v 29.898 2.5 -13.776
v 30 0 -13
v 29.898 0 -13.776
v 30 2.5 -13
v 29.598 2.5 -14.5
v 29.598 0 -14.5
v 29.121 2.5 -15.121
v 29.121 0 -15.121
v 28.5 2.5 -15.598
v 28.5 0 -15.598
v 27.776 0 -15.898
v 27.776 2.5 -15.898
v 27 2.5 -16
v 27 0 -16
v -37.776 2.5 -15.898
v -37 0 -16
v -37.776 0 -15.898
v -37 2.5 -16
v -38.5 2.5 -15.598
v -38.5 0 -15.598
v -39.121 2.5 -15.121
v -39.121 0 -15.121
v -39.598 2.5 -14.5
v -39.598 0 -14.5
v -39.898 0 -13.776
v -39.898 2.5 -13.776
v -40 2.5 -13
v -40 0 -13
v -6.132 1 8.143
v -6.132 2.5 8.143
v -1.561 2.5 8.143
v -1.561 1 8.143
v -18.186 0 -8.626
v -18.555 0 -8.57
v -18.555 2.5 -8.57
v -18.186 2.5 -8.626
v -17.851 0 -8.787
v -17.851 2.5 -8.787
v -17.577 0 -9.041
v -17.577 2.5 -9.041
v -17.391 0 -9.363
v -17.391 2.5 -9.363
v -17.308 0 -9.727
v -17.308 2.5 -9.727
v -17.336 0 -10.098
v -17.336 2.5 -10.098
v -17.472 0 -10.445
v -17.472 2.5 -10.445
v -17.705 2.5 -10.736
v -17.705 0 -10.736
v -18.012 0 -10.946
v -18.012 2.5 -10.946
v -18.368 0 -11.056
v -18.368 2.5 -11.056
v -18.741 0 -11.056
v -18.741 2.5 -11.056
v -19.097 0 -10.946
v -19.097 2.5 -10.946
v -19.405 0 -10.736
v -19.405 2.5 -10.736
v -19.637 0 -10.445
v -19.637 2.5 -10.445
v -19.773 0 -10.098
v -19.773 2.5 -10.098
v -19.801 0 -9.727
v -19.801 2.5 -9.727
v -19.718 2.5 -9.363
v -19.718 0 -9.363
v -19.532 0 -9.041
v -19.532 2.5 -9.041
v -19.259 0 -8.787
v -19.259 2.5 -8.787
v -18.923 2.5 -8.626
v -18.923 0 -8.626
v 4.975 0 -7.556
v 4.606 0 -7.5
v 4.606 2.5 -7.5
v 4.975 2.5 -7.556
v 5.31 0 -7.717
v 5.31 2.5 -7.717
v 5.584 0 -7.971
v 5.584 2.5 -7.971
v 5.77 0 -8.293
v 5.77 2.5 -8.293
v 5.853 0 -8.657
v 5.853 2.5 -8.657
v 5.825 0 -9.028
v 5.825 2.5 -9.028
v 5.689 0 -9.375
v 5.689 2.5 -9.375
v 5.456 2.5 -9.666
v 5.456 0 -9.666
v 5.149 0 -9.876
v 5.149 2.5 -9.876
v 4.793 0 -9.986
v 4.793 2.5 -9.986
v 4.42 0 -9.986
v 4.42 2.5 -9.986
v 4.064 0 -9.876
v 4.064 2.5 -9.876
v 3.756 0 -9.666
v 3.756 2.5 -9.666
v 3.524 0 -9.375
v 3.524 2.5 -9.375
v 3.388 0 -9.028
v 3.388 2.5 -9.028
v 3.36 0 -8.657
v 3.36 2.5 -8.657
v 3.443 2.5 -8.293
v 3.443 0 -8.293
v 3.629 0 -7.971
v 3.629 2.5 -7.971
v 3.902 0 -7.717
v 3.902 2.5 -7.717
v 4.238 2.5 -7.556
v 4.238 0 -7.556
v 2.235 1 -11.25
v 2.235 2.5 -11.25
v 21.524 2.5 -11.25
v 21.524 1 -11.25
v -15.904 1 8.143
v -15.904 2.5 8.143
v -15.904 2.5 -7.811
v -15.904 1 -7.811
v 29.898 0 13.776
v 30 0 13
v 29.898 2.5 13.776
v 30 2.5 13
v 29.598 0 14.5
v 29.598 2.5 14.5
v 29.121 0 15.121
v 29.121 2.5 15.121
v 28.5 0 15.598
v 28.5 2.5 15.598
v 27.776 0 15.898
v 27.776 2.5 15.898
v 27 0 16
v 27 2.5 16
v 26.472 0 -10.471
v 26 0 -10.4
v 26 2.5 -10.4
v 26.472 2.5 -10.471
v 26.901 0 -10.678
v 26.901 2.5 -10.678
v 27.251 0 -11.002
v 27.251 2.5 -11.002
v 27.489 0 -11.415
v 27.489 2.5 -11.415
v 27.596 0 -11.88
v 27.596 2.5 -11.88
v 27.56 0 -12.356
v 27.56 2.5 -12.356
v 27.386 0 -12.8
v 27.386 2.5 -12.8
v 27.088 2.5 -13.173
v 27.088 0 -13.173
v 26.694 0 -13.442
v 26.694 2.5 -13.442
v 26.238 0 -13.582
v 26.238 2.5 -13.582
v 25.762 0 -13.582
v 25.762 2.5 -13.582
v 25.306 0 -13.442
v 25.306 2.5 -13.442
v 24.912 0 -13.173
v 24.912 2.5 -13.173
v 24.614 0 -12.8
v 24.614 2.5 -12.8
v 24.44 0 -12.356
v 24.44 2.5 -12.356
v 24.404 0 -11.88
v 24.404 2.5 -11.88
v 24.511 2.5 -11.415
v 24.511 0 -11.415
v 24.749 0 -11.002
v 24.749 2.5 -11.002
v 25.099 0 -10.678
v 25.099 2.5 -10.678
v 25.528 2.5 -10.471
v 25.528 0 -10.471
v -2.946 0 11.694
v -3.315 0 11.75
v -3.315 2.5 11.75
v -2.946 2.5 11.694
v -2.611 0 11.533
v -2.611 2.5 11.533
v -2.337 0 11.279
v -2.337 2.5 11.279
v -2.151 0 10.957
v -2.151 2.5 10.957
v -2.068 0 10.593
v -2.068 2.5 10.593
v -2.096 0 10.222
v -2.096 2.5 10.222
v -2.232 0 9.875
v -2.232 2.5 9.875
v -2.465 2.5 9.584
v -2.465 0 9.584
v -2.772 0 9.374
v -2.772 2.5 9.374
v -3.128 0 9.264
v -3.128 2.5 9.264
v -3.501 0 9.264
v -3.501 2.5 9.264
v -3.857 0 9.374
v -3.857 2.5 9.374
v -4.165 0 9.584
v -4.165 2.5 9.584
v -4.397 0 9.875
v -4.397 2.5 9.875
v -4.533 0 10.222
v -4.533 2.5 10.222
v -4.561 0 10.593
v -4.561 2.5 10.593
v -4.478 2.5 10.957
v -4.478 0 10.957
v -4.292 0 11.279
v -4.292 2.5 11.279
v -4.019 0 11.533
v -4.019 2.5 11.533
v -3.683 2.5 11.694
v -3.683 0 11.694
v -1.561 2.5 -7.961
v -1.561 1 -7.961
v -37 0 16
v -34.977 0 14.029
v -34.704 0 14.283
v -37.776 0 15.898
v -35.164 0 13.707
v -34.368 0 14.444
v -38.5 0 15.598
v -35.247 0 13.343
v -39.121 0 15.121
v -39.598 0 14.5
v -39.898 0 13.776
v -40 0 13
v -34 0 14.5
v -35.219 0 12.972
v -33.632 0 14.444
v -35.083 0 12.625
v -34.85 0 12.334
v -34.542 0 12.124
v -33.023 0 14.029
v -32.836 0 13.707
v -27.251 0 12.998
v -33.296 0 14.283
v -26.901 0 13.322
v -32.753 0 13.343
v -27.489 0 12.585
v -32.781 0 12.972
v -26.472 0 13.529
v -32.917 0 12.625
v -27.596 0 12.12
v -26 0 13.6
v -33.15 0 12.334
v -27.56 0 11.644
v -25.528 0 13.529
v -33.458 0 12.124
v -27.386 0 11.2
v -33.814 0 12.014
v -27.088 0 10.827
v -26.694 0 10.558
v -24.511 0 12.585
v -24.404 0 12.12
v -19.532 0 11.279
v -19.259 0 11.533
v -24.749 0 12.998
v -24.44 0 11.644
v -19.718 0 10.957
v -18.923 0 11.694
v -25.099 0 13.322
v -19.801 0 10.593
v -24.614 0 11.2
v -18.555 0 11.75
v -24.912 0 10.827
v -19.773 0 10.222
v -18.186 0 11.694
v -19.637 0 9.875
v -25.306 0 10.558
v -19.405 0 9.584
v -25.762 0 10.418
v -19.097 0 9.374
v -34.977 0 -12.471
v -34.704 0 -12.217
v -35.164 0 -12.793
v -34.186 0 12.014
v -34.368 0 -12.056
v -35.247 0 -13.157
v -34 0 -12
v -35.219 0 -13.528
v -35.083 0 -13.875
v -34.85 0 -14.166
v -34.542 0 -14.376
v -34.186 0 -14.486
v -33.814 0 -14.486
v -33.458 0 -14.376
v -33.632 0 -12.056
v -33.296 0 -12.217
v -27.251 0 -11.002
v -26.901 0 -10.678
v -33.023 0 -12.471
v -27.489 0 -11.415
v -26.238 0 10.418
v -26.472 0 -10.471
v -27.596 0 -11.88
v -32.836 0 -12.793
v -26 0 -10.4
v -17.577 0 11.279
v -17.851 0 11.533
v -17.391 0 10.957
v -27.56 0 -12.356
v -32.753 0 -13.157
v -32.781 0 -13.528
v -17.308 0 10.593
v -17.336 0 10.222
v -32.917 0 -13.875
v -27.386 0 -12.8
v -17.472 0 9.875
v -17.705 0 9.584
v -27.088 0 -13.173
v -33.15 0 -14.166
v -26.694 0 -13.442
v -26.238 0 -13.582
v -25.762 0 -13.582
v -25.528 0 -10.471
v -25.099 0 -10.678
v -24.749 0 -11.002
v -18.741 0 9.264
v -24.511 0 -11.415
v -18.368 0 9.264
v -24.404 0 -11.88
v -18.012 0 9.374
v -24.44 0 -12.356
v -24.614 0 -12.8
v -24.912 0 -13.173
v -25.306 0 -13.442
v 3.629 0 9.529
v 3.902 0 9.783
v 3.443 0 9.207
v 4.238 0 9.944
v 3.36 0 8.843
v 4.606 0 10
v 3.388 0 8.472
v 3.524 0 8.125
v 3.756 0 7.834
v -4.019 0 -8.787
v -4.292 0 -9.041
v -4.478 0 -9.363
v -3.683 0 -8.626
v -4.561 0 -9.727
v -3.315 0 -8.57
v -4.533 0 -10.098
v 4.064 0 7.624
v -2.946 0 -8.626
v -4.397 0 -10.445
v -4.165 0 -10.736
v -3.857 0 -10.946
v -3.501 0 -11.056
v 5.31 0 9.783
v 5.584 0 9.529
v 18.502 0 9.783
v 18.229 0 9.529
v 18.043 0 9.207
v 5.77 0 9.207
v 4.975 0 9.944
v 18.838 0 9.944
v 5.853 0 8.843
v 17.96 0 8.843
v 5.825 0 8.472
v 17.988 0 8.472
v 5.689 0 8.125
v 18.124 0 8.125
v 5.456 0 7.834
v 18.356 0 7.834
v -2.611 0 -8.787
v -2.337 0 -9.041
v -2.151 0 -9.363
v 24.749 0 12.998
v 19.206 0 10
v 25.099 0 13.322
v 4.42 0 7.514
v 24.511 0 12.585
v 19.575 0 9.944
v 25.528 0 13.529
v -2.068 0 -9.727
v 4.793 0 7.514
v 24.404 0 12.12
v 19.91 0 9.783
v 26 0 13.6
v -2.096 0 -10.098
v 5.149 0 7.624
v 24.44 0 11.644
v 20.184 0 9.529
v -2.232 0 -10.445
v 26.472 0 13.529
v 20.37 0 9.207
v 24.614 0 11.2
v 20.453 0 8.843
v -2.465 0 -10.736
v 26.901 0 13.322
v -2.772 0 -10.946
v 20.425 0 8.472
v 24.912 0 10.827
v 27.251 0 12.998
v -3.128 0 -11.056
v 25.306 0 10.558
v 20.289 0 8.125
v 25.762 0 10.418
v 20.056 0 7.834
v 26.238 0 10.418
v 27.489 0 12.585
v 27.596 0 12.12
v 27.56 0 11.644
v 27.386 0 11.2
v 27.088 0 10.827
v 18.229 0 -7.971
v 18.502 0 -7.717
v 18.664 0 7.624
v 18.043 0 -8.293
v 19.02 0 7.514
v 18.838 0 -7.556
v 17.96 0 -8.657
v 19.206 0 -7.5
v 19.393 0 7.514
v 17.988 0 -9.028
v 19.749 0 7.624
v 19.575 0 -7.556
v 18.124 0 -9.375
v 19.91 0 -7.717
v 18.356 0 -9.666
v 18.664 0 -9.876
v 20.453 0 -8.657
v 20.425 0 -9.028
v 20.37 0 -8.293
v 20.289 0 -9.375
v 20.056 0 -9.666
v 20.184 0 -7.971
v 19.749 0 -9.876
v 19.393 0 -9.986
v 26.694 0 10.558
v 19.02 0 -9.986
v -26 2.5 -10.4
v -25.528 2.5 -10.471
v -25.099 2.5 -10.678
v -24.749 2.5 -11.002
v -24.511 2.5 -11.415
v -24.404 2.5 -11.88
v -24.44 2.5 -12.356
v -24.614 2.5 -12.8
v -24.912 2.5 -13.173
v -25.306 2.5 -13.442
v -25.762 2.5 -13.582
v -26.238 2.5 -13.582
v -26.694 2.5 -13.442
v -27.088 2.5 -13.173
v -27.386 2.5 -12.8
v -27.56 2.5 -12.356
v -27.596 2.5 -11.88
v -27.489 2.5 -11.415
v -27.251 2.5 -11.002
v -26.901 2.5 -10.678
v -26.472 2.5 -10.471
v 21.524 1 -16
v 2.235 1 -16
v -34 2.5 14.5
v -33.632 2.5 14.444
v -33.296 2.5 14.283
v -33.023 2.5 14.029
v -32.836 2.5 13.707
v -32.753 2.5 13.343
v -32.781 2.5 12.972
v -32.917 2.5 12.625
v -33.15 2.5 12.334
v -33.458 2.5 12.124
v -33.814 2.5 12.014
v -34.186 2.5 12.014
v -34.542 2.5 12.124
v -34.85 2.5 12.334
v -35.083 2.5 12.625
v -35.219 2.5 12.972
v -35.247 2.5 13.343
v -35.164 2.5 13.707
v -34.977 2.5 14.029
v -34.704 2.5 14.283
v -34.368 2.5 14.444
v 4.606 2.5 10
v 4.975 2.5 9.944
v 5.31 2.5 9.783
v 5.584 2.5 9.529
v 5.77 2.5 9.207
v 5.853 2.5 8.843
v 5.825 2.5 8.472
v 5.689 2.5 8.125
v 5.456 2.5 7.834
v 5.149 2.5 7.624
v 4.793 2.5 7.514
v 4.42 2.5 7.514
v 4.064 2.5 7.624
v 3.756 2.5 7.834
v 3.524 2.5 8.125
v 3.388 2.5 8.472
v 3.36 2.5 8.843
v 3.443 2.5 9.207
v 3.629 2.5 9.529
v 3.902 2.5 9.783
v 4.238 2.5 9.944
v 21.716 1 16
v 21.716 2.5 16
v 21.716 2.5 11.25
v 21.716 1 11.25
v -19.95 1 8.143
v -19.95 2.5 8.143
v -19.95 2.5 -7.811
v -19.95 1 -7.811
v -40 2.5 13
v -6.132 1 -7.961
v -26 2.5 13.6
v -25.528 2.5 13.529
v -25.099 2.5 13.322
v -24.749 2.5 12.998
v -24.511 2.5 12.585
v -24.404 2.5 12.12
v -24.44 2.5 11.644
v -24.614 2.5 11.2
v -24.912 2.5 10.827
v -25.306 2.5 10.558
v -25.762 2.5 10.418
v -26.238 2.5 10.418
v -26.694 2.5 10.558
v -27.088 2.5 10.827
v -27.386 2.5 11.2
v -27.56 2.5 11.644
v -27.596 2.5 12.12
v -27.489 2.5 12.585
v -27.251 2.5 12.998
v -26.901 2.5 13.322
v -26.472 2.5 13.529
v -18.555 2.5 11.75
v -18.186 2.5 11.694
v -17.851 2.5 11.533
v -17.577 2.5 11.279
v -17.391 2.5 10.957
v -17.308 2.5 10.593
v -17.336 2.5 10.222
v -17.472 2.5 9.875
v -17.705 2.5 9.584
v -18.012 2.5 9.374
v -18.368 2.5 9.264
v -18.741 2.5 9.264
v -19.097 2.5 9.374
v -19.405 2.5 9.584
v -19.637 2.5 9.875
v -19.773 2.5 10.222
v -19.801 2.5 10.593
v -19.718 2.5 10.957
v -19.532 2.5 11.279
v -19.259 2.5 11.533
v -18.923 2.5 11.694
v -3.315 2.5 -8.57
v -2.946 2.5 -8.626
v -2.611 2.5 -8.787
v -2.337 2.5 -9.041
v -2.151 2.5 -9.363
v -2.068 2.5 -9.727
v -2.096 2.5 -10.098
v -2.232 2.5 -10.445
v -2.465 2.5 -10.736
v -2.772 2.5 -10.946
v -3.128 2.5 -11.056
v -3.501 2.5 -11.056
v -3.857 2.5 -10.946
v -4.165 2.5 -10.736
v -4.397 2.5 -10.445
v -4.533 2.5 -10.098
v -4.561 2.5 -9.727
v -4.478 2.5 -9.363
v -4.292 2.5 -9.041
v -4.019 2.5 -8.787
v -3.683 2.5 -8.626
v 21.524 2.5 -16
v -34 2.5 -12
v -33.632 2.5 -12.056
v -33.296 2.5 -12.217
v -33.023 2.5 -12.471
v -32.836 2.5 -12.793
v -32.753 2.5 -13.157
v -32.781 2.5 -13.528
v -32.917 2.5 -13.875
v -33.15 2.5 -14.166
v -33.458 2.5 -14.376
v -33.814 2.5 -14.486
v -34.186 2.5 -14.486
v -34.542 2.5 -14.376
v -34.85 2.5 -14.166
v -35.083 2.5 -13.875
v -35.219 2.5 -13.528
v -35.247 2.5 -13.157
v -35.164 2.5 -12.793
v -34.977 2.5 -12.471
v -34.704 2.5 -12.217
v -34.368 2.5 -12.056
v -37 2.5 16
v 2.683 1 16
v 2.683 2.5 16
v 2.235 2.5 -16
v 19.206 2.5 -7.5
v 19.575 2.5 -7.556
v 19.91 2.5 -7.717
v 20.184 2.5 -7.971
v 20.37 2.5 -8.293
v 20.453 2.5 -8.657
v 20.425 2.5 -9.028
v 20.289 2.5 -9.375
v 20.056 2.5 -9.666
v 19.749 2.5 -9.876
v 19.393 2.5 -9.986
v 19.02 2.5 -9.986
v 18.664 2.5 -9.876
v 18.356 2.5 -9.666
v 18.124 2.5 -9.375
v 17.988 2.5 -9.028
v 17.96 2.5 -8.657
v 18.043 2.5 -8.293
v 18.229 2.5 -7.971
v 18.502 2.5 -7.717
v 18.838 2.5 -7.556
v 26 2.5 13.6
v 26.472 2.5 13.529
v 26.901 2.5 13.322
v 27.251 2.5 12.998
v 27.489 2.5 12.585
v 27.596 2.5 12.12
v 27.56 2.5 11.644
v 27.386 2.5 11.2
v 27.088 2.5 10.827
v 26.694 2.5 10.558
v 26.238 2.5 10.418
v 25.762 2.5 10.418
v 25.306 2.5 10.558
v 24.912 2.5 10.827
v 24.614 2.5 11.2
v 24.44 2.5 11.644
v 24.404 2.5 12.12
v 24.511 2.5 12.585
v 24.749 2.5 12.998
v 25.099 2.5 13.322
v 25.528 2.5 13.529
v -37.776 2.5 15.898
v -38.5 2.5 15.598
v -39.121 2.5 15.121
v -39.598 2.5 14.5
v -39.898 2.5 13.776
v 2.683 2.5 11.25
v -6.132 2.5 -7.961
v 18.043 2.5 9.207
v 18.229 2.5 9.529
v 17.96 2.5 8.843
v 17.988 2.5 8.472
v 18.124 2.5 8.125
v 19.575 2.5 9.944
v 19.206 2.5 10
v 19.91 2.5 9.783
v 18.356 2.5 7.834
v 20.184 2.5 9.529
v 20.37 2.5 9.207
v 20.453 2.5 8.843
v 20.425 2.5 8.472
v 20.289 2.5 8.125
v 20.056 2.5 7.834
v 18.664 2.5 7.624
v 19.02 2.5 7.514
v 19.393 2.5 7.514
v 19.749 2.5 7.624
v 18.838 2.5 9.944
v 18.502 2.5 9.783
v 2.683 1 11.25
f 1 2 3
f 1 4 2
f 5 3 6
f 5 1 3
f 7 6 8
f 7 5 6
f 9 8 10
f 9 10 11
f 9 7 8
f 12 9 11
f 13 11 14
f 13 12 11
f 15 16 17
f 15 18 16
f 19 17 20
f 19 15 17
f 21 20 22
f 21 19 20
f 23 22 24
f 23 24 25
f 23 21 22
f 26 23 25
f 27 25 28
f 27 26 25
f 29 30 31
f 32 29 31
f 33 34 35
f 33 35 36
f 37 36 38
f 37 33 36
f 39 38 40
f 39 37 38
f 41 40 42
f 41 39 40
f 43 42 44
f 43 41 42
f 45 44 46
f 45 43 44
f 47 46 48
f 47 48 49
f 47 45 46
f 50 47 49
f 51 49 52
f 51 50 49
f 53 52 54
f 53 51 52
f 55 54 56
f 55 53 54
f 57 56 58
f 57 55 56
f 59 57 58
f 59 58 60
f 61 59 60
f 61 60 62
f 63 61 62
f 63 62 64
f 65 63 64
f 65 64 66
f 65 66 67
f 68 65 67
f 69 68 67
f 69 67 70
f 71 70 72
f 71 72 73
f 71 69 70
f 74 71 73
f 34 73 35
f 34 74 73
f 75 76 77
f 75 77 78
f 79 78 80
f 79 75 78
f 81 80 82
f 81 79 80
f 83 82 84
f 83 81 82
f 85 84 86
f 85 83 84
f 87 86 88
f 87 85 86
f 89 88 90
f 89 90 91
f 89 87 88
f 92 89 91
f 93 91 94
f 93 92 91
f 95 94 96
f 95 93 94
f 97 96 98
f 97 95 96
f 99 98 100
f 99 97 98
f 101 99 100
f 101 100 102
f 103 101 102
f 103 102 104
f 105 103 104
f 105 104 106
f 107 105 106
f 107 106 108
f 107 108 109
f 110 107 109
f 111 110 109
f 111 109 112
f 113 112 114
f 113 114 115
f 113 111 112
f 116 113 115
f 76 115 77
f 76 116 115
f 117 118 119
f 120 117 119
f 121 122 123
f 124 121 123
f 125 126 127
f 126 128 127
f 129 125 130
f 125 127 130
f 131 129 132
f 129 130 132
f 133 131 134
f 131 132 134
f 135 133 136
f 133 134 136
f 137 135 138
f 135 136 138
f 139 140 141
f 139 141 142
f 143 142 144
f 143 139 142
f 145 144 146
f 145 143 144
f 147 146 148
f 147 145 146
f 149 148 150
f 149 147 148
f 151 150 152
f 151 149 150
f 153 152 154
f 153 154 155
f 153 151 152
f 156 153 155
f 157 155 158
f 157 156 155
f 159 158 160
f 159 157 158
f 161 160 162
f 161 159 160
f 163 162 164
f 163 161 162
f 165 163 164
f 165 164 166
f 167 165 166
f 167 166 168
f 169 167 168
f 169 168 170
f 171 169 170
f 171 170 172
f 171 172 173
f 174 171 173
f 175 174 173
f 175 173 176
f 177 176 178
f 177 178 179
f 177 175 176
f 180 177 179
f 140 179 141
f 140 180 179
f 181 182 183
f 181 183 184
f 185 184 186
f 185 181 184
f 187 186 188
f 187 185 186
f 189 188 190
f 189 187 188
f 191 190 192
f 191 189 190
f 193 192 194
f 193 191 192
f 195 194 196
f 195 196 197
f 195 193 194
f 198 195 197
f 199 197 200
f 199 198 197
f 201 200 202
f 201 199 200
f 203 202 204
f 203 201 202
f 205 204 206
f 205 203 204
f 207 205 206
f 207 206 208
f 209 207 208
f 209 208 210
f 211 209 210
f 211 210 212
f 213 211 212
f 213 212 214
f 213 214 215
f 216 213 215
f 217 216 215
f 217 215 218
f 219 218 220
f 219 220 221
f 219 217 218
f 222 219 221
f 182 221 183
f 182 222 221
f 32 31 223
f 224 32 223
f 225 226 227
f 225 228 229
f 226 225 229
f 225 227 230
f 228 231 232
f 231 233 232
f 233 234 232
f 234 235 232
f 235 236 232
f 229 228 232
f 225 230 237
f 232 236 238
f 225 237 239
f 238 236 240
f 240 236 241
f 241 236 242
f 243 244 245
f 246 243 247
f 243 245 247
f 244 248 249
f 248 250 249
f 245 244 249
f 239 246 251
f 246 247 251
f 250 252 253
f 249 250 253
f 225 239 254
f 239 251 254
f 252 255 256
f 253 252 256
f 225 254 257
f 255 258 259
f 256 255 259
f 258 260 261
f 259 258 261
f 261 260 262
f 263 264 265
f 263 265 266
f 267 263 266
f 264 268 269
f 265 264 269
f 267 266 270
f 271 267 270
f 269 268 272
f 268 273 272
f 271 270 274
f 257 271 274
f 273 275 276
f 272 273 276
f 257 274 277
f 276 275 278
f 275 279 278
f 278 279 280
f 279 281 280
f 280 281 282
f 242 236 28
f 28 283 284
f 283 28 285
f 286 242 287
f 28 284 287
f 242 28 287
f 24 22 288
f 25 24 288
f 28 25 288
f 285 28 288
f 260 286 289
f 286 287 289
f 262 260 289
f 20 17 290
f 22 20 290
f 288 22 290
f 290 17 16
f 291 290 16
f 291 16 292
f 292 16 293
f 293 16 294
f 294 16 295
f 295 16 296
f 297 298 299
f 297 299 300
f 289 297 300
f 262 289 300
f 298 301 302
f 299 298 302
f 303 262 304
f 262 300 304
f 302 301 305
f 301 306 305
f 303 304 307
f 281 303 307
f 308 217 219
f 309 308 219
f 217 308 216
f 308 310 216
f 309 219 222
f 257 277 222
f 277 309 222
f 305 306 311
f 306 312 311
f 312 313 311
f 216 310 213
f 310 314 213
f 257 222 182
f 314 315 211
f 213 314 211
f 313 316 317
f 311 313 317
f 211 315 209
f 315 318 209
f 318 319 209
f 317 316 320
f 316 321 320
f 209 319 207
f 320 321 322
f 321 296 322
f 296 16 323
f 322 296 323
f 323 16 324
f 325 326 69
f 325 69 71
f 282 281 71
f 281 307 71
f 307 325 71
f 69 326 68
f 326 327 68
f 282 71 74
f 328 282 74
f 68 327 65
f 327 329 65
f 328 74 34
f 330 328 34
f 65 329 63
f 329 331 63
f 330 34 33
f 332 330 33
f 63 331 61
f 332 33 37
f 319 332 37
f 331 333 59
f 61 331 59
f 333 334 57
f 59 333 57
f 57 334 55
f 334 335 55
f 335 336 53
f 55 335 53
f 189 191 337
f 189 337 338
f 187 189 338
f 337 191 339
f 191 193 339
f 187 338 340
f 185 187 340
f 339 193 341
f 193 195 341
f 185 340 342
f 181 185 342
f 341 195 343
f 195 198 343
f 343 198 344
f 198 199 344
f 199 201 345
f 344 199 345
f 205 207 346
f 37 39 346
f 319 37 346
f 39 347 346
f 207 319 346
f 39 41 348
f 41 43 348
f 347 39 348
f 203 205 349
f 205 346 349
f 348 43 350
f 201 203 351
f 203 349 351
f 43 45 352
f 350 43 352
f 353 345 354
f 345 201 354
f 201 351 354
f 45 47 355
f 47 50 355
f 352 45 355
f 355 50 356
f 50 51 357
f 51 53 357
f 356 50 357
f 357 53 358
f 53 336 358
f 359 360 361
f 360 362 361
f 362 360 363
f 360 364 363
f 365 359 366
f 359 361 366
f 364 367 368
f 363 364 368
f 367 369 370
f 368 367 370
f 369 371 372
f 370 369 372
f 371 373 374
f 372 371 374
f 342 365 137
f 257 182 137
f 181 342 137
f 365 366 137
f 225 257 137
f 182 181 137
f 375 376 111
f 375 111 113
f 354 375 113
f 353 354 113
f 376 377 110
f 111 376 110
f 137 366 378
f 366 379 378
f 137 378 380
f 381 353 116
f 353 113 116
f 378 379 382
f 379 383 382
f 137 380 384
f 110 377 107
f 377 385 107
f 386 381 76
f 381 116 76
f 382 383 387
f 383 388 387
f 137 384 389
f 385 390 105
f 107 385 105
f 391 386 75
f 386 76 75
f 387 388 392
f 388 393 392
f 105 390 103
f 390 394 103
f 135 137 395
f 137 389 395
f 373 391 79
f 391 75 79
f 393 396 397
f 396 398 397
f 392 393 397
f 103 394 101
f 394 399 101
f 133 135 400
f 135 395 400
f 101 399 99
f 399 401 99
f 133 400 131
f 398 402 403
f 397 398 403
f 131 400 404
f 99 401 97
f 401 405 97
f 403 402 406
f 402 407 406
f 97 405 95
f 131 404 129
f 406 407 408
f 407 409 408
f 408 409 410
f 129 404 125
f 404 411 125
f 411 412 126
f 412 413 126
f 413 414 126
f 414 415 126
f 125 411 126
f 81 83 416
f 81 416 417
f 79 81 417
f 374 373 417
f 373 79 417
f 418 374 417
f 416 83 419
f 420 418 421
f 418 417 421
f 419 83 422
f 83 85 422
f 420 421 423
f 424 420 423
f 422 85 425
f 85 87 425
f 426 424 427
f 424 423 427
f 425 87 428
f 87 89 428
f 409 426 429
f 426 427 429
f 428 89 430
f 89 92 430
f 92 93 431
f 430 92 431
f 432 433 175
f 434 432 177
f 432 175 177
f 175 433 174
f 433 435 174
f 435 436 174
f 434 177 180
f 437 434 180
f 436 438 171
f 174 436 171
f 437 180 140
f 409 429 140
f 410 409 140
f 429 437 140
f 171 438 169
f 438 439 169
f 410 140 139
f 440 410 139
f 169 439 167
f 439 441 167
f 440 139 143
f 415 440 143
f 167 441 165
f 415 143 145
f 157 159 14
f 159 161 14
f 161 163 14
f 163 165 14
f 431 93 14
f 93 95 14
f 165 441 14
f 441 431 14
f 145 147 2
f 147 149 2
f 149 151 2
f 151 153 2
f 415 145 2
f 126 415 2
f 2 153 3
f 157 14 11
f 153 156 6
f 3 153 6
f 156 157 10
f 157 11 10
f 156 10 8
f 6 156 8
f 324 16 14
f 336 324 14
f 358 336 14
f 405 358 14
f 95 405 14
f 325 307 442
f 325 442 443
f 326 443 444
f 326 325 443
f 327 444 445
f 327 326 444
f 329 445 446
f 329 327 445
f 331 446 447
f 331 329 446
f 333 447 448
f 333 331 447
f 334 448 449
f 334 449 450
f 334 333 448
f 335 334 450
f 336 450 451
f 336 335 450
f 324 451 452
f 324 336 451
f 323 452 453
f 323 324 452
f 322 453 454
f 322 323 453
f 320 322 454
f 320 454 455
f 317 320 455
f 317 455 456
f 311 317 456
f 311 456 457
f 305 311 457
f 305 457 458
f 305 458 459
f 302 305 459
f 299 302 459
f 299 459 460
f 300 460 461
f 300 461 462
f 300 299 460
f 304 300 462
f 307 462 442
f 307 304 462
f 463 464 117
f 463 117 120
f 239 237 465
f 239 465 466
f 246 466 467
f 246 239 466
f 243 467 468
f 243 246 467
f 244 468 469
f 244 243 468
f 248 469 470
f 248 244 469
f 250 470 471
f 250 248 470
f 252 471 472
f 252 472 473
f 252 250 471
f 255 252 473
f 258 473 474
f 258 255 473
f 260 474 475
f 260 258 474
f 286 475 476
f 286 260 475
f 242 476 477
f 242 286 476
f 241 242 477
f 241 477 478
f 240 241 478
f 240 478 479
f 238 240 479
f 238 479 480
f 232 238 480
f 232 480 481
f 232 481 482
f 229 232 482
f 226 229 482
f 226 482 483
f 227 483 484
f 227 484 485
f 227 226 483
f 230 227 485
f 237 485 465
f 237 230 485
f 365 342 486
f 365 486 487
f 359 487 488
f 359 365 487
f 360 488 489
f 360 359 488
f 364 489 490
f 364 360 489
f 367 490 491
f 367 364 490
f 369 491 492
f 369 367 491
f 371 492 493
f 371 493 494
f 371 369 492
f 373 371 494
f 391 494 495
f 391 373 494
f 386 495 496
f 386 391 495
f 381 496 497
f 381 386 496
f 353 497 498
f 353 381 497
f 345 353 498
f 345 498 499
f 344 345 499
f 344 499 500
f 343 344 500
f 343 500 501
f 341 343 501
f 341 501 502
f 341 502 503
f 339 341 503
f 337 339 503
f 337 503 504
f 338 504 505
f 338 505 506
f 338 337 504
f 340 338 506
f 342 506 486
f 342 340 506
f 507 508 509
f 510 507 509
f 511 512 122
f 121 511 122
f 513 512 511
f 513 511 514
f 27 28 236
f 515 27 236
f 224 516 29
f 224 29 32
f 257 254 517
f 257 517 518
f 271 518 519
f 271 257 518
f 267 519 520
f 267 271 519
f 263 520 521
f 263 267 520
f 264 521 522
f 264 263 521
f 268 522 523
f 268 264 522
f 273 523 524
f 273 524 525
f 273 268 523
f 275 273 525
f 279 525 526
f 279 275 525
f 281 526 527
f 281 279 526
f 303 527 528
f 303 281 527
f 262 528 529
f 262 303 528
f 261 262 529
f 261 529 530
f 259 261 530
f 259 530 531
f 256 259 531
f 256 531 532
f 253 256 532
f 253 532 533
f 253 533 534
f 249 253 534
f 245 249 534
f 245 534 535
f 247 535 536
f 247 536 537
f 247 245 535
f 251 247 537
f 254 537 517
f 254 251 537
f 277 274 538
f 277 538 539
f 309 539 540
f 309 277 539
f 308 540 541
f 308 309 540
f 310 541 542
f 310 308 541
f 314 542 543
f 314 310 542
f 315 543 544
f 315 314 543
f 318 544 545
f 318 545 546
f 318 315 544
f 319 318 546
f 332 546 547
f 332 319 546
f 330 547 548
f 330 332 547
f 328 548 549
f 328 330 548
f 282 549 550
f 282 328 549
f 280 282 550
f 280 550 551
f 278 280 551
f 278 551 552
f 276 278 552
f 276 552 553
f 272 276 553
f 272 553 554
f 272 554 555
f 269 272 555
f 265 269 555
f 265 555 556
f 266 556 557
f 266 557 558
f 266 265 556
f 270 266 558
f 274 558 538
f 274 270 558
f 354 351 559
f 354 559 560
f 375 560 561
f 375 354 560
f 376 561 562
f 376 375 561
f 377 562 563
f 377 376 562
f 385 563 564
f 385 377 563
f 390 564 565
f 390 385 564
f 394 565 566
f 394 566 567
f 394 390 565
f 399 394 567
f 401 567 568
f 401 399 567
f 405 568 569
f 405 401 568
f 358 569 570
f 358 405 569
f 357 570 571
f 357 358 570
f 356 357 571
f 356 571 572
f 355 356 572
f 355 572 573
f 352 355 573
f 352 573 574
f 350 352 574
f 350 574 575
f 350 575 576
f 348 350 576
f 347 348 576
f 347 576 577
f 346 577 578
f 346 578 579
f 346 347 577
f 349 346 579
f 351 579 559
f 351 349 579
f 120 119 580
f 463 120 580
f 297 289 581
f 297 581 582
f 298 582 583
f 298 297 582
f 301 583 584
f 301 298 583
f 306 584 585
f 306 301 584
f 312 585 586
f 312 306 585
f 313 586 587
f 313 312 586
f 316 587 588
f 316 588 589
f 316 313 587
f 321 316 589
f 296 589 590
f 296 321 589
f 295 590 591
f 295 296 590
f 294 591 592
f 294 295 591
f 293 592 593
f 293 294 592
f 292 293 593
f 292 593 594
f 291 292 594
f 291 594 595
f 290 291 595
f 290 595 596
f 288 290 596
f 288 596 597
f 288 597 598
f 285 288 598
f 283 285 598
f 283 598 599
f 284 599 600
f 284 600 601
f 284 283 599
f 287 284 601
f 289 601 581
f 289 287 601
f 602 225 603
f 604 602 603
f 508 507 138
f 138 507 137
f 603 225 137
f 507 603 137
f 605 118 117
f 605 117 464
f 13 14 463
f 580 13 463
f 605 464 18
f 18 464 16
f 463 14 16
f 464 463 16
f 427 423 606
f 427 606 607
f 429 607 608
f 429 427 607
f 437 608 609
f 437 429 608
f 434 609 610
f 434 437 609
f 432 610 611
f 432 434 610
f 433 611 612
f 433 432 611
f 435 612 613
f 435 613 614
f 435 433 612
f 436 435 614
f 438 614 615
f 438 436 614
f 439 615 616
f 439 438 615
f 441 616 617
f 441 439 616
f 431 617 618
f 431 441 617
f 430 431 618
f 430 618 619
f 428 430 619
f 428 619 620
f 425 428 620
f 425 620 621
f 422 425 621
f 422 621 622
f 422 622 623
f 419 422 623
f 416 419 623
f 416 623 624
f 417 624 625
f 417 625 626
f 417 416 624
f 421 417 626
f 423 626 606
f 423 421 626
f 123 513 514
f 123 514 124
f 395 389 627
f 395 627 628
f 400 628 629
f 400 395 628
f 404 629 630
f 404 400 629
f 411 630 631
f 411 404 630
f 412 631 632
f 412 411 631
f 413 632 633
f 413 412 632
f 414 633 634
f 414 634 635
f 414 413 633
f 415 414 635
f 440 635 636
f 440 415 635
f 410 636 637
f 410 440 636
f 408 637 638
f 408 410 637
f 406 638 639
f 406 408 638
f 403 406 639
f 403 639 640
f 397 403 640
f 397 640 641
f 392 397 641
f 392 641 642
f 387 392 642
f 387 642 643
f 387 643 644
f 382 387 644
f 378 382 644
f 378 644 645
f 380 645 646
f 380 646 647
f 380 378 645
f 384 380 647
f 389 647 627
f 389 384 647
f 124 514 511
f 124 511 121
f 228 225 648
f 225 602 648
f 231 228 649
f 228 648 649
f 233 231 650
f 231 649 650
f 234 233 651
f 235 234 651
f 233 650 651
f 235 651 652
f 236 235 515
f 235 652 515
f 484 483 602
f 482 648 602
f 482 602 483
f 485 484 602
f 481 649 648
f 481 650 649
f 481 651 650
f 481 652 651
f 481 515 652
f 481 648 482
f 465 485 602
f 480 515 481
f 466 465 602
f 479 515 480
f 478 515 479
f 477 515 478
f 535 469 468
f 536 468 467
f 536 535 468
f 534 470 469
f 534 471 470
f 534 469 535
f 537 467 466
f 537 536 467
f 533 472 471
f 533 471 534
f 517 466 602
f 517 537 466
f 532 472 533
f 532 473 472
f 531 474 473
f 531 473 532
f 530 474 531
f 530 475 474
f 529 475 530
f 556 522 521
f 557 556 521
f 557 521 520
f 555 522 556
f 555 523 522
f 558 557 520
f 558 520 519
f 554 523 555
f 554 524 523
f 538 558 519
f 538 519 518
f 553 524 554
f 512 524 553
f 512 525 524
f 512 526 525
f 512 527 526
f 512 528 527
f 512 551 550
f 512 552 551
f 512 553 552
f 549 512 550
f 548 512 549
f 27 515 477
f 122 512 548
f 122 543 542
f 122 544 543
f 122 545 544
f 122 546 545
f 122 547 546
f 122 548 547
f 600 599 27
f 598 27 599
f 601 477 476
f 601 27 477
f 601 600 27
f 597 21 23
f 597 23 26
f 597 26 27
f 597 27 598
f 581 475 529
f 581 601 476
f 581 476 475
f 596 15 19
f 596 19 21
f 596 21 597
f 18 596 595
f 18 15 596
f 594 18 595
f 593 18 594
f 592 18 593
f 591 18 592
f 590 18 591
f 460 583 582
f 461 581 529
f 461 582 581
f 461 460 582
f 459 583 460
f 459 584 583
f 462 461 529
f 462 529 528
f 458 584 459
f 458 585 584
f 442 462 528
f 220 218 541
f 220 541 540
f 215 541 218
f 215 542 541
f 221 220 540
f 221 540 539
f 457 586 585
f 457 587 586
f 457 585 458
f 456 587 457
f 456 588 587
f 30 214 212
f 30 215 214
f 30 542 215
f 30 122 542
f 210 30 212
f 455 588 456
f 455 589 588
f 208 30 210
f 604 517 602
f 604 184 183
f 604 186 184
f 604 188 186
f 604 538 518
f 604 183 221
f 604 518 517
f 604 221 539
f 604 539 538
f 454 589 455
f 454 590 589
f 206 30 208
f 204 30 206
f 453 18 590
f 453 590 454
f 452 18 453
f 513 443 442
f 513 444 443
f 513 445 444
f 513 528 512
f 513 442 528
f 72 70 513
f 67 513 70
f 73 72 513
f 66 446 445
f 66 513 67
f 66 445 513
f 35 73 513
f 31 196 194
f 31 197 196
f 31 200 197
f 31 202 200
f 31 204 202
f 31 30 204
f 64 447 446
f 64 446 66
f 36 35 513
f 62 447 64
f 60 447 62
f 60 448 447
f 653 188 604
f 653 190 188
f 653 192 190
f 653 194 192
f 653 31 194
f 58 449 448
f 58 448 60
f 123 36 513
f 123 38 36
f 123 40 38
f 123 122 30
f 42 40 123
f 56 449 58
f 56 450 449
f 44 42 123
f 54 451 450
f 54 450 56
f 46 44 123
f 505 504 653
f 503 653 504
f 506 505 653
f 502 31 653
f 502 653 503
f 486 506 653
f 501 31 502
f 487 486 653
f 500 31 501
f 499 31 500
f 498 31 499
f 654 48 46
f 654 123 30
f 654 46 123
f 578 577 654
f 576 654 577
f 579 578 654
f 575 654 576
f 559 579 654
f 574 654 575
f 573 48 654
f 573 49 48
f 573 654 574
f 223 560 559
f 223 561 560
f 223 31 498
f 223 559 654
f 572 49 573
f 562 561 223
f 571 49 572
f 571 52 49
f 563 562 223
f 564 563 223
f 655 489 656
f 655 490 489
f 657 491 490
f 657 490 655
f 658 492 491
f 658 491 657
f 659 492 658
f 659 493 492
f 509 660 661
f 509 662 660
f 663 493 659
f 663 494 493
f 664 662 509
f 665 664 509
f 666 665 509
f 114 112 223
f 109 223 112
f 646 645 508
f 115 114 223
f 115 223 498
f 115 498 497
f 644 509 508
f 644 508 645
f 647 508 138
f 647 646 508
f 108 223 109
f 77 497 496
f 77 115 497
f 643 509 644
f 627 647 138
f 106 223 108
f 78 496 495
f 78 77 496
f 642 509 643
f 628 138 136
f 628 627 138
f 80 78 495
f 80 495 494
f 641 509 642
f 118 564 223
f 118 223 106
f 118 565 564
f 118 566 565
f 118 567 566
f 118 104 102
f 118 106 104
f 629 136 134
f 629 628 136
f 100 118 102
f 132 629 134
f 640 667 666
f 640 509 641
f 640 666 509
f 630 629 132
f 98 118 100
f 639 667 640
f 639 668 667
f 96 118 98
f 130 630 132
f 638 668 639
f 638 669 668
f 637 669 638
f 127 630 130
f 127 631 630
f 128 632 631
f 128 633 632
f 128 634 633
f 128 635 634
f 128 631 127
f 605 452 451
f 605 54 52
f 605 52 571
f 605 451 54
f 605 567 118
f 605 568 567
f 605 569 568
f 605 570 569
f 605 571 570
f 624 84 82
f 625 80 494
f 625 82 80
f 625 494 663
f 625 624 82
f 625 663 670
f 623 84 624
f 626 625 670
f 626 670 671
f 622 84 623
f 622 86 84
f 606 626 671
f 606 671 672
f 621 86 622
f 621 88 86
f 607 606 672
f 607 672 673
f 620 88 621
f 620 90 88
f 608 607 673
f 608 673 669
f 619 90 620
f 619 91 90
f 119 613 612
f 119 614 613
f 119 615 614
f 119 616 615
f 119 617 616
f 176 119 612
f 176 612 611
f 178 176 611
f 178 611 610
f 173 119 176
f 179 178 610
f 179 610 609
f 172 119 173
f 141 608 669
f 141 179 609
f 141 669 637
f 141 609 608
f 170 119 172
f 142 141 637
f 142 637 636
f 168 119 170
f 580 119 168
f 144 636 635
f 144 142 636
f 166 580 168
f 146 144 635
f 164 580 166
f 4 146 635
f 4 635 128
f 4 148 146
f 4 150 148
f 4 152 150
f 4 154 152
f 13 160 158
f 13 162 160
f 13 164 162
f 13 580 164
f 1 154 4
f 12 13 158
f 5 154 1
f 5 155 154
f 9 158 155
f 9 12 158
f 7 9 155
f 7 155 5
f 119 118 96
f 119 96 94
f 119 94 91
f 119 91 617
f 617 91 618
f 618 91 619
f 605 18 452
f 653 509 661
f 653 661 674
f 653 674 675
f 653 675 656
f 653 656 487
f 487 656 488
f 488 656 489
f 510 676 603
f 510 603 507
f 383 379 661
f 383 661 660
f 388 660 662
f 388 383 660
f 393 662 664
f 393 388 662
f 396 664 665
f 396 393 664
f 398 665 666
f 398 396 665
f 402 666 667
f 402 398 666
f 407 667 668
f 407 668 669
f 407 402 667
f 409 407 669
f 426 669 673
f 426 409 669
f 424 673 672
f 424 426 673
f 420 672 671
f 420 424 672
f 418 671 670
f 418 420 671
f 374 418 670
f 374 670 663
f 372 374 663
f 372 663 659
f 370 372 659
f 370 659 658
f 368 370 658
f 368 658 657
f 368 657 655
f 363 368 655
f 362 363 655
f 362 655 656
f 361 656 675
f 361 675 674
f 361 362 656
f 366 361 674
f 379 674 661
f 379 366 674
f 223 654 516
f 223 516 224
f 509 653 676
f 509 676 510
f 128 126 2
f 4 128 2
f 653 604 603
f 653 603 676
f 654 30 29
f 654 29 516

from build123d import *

# Parameters (mm, degrees)
SKETCH1_R           = 1.6
SKETCH1_R_2         = 1.25
BOSS_EXTRUDE1_DEPTH = 2.5
SKETCH4_W           = 4.046420923
SKETCH4_H           = 15.954838713
SKETCH4_W_2         = 4.570038916
SKETCH4_H_2         = 16.10433934
SKETCH4_W_3         = 19.288754193
SKETCH4_H_3         = 4.75
SKETCH4_W_4         = 19.033274005
CUT_EXTRUDE2_DEPTH  = 1.5
FILLET1_R           = 3


with BuildPart() as part:
    # Sketch1 → Boss-Extrude1 (new body)
    with BuildSketch(Plane(origin=(0, 0, 0), x_dir=(1, 0, 0), z_dir=(0, 1, 0))):
        Polygon((-30, -16), (30, -16), (30, 16), (-30, 16), (-40, 16), (-40, -16), align=None)
        with Locations(Location((-26, 12, 0), (0, 0, 270))):
            Circle(SKETCH1_R, mode=Mode.SUBTRACT)
        with Locations(Location((26, 12, 0), (0, 0, 270))):
            Circle(SKETCH1_R, mode=Mode.SUBTRACT)
        with Locations(Location((26, -12, 0), (0, 0, 270))):
            Circle(SKETCH1_R, mode=Mode.SUBTRACT)
        with Locations(Location((-26, -12, 0), (0, 0, 270))):
            Circle(SKETCH1_R, mode=Mode.SUBTRACT)
        with Locations(Location((-18.554722835, 9.82, 0), (0, 0, 270))):
            Circle(SKETCH1_R_2, mode=Mode.SUBTRACT)
        with Locations(Location((-3.314722835, 9.82, 0), (0, 0, 270))):
            Circle(SKETCH1_R_2, mode=Mode.SUBTRACT)
        with Locations(Location((-3.314722835, -10.5, 0), (0, 0, 270))):
            Circle(SKETCH1_R_2, mode=Mode.SUBTRACT)
        with Locations(Location((-18.554722835, -10.5, 0), (0, 0, 270))):
            Circle(SKETCH1_R_2, mode=Mode.SUBTRACT)
        with Locations(Location((4.60621428, 8.75, 0), (0, 0, 270))):
            Circle(SKETCH1_R_2, mode=Mode.SUBTRACT)
        with Locations(Location((19.20621428, 8.75, 0), (0, 0, 270))):
            Circle(SKETCH1_R_2, mode=Mode.SUBTRACT)
        with Locations(Location((19.20621428, -8.75, 0), (0, 0, 270))):
            Circle(SKETCH1_R_2, mode=Mode.SUBTRACT)
        with Locations(Location((4.60621428, -8.75, 0), (0, 0, 270))):
            Circle(SKETCH1_R_2, mode=Mode.SUBTRACT)
        with Locations(Location((-34, 13.25, 0), (0, 0, 270))):
            Circle(SKETCH1_R_2, mode=Mode.SUBTRACT)
        with Locations(Location((-34, -13.25, 0), (0, 0, 270))):
            Circle(SKETCH1_R_2, mode=Mode.SUBTRACT)
    extrude(amount=BOSS_EXTRUDE1_DEPTH)

    # Sketch4 → Cut-Extrude2 (cut)
    with BuildSketch(Plane(origin=(0, 2.5, 0), x_dir=(1, 0, 0), z_dir=(0, 1, 0))):
        with Locations((-17.926852164, -0.166011636)):
            Rectangle(SKETCH4_W, SKETCH4_H)
        with Locations((-3.846505054, -0.091261322)):
            Rectangle(SKETCH4_W_2, SKETCH4_H_2)
        with Locations((11.879828742, 13.625)):
            Rectangle(SKETCH4_W_3, SKETCH4_H_3)
        with Locations((12.199178977, -13.625)):
            Rectangle(SKETCH4_W_4, SKETCH4_H_3)
    extrude(amount=-CUT_EXTRUDE2_DEPTH, mode=Mode.SUBTRACT)

    # Fillet1
    fillet1_edges = [part.edges().sort_by_distance(p)[0] for p in [
        (30, 1.25, 16),
        (-40, 1.25, 16),
        (-40, 1.25, -16),
        (30, 1.25, -16),
    ]]
    fillet(fillet1_edges, radius=FILLET1_R)


solid = part.part
